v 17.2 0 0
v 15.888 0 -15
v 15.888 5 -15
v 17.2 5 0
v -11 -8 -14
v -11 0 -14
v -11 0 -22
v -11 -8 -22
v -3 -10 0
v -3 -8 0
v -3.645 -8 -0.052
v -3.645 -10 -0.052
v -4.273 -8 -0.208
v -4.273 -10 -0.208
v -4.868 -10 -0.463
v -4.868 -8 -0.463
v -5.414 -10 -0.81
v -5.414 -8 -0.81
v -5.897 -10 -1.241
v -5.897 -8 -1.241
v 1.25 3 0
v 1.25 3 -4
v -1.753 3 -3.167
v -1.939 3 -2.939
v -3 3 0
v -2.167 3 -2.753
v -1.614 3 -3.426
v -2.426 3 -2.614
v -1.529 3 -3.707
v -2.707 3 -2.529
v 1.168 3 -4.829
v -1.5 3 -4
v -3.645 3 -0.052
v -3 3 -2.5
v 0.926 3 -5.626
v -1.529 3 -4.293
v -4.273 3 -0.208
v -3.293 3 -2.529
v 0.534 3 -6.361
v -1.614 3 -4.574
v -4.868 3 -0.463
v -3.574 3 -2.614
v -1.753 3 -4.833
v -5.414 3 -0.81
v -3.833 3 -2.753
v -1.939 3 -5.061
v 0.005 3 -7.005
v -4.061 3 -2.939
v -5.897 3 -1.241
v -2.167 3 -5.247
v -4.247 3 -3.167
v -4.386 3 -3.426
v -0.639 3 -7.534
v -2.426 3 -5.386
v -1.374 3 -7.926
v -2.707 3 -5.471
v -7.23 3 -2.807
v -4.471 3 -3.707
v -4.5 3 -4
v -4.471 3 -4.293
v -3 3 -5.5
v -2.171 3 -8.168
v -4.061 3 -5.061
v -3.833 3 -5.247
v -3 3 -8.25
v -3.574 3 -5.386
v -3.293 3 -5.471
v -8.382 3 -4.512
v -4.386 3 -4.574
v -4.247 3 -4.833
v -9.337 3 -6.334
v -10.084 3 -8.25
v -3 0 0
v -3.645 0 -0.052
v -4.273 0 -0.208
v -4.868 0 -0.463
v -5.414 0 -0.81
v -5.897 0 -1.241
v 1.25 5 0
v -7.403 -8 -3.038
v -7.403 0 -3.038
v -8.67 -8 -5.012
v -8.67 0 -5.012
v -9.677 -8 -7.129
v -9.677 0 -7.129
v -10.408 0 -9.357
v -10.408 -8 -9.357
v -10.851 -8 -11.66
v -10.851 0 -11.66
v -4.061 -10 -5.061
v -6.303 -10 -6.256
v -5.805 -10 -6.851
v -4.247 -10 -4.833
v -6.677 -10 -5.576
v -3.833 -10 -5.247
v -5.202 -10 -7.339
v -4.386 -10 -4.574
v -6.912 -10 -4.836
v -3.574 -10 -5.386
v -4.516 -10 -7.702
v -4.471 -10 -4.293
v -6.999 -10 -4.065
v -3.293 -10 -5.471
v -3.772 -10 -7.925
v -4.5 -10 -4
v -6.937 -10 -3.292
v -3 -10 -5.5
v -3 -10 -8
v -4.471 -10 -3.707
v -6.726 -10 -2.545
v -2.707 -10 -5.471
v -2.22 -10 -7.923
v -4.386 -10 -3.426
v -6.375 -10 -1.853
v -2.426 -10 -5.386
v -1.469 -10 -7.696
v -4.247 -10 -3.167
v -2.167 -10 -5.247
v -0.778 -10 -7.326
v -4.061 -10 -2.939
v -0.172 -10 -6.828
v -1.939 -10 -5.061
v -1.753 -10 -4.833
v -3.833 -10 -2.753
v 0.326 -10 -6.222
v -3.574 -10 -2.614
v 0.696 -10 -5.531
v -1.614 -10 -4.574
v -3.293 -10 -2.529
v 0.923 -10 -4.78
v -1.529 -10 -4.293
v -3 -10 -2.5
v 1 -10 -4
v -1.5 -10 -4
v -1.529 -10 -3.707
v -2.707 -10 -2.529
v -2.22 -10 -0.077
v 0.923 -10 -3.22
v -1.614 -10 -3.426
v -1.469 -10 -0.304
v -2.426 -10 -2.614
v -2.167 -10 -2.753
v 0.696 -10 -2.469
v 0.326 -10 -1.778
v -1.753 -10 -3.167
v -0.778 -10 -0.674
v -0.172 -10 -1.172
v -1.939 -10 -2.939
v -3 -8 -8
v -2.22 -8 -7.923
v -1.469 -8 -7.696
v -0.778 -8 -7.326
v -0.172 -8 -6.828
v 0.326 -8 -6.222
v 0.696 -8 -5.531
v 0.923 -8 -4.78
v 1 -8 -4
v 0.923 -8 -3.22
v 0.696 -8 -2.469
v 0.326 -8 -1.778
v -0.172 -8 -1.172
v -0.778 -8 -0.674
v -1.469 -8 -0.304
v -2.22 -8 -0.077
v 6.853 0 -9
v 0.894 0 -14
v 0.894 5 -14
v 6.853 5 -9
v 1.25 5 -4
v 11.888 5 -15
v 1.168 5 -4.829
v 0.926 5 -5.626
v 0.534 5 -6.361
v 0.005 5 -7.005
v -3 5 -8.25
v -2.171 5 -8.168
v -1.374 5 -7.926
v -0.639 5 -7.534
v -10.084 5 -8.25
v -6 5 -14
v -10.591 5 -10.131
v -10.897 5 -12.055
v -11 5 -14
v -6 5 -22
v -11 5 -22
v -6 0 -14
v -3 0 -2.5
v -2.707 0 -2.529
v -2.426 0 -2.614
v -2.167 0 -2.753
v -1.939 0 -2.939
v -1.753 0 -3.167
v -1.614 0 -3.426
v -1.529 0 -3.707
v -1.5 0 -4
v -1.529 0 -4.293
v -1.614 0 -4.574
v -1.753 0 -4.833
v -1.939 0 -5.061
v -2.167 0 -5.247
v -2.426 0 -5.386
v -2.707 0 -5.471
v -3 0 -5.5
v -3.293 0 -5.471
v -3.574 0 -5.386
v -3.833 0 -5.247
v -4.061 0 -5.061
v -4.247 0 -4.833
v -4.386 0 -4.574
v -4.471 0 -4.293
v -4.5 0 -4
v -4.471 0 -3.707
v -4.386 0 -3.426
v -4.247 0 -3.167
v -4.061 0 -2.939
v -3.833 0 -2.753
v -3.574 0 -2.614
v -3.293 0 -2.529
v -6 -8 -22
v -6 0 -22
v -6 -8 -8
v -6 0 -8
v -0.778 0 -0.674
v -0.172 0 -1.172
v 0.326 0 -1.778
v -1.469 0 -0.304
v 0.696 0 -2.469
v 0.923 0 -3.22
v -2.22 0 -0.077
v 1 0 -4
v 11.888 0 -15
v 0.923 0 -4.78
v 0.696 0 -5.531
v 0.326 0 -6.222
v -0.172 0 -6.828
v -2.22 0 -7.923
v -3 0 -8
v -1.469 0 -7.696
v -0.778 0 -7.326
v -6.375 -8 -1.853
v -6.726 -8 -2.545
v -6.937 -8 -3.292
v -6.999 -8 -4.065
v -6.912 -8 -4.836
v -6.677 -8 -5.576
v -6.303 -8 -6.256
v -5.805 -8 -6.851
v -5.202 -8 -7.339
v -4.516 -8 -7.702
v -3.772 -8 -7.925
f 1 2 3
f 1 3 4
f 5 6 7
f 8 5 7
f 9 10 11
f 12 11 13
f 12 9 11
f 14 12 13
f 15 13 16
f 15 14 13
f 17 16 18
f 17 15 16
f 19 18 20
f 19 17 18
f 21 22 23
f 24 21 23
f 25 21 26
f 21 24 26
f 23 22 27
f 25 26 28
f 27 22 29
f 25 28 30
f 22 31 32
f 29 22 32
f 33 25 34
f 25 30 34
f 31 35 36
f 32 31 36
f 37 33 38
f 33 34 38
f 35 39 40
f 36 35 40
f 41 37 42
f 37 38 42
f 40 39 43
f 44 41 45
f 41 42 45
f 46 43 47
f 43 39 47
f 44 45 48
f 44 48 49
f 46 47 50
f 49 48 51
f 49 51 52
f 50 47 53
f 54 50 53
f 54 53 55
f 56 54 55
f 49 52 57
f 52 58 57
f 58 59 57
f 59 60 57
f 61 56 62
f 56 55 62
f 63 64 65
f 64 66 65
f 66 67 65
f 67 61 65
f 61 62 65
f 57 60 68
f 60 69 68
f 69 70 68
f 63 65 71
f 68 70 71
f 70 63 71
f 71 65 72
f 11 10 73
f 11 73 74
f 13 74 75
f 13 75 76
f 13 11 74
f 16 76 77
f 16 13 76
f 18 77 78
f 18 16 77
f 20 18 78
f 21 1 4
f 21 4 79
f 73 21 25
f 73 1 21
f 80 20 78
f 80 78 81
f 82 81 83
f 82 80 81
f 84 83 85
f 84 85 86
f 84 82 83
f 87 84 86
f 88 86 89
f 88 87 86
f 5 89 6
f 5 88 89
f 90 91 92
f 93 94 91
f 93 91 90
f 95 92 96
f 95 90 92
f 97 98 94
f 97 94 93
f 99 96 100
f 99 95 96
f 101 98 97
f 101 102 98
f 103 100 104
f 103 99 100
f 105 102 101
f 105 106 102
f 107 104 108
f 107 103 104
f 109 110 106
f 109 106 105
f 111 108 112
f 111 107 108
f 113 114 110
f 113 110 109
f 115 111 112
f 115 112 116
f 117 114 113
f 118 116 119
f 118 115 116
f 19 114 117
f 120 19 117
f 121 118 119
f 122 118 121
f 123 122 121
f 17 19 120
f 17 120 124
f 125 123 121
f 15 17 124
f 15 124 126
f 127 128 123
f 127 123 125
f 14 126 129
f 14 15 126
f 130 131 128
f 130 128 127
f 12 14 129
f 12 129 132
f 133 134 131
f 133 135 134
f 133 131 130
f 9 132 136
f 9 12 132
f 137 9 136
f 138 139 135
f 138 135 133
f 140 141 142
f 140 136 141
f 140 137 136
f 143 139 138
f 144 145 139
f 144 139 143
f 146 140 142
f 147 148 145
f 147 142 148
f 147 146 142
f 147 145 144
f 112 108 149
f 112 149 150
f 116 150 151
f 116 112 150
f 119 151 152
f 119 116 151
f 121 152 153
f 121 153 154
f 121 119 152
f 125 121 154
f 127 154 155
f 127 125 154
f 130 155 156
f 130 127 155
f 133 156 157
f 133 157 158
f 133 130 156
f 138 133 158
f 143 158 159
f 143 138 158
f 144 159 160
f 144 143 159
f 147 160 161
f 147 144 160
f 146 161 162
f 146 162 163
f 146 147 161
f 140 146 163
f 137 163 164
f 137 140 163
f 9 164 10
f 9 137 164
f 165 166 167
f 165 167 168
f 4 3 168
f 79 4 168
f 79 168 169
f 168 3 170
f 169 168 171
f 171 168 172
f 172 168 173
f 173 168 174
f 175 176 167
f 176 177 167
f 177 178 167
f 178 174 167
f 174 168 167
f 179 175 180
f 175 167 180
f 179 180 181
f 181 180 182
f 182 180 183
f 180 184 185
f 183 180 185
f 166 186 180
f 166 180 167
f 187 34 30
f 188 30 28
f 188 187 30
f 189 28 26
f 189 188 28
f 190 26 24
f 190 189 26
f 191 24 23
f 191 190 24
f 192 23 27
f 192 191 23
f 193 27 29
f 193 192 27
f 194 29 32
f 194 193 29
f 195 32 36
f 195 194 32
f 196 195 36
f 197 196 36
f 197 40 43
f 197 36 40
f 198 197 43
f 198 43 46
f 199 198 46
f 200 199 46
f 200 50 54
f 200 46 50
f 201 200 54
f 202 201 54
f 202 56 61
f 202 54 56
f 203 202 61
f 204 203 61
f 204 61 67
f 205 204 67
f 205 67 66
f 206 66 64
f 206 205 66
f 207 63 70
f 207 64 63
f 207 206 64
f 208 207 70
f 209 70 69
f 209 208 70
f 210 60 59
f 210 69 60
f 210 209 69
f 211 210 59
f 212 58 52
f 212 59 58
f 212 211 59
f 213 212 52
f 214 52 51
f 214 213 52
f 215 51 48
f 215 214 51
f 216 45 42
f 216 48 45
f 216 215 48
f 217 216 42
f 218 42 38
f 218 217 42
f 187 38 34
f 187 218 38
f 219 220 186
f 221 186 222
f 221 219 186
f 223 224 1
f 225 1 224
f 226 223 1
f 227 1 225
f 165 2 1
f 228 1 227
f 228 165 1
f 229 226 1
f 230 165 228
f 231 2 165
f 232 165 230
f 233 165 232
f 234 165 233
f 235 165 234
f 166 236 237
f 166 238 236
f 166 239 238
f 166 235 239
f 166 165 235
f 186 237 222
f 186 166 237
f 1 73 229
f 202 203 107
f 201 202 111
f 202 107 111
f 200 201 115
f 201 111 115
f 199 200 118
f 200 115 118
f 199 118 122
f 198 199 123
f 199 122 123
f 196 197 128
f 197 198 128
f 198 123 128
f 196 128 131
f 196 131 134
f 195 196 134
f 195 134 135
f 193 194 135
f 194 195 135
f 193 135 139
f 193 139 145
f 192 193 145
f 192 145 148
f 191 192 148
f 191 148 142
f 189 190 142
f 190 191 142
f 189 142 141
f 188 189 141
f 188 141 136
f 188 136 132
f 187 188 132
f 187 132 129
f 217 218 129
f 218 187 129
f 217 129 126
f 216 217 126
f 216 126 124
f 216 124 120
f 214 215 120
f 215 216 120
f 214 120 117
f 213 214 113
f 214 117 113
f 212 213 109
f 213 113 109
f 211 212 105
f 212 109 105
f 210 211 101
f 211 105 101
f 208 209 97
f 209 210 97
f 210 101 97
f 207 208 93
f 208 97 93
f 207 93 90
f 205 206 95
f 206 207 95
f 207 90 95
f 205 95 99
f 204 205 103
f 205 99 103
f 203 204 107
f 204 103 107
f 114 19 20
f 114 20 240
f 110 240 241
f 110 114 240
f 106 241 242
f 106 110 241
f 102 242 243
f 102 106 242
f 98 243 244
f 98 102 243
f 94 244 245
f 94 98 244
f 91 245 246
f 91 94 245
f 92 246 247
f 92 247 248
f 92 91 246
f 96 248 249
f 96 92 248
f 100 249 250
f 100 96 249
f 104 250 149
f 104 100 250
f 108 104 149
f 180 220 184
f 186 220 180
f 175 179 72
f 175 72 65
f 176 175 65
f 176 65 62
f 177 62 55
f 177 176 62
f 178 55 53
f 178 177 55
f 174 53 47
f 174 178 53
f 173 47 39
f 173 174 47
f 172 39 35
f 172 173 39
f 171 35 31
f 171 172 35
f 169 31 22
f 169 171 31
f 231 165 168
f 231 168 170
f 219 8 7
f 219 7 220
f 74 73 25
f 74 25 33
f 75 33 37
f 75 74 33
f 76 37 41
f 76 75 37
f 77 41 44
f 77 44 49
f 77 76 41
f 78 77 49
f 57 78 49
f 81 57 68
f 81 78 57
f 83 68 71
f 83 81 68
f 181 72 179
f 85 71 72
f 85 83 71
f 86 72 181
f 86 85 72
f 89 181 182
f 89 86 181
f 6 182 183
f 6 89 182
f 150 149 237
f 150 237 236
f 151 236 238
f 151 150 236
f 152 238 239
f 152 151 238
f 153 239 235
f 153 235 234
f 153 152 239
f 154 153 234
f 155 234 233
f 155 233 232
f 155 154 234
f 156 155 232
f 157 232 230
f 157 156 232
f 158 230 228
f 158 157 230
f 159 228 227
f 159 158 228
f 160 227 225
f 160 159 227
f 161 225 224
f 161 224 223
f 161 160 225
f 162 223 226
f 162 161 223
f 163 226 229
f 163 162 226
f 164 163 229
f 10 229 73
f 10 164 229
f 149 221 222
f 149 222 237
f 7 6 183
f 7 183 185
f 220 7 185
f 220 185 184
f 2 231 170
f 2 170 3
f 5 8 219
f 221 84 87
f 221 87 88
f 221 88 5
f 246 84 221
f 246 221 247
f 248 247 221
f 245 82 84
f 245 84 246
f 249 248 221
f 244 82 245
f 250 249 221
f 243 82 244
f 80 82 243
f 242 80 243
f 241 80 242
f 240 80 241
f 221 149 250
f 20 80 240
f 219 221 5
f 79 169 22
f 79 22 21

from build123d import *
from build123d.topology import SkipClean

# Parameters (mm, degrees)
SKETCH1_R           = 1.5
BOSS_EXTRUDE1_DEPTH = 5
BOSS_EXTRUDE2_START = 10
SKETCH2_R           = 1.5
BOSS_EXTRUDE2_DEPTH = 10
CUT_EXTRUDE1_DEPTH  = 2
SKETCH4_OUTSIDE_W   = 37.956
SKETCH4_OUTSIDE_H   = 31.756
SKETCH4_OUTSIDE_R   = 4
CUT_EXTRUDE2_DEPTH  = 2


with BuildPart() as part:
    # Sketch1 → Boss-Extrude1 (new body)
    with BuildSketch(Plane(origin=(0, 0, 0), x_dir=(1, 0, 0), z_dir=(0, 1, 0))):
        with BuildLine():
            Line((-11, 14), (-11, 22))
            Line((-11, 22), (-6, 22))
            Line((-6, 22), (-6, 14))
            Line((-6, 14), (0.894304297, 14))
            Line((0.894304297, 14), (6.85307226, 9))
            Line((6.85307226, 9), (11.887670047, 15))
            Line((11.887670047, 15), (15.887670047, 15))
            Line((15.887670047, 15), (17.2, 0))
            Line((17.2, 0), (-3, 0))
            ThreePointArc((-3, 0), (-4.575677194, 0.32341988), (-5.896551724, 1.24137931))
            ThreePointArc((-5.896551724, 1.24137931), (-9.676818781, 7.129272487), (-11, 14))
        make_face()
        with Locations(Location((-3, 4, 0), (0, 0, 270))):
            Circle(SKETCH1_R, mode=Mode.SUBTRACT)
    extrude(amount=BOSS_EXTRUDE1_DEPTH)

    # Sketch2 → Boss-Extrude2 (add)
    with SkipClean():  # the faces are left unmerged after this step: merging them gives an invalid solid
        with BuildSketch(Plane.XZ.offset(BOSS_EXTRUDE2_START)):
            with BuildLine():
                Line((-11, -14), (-11, -22))
                Line((-11, -22), (-6, -22))
                Line((-6, -22), (-6, -8))
                Line((-6, -8), (-3, -8))
                ThreePointArc((-3, -8), (1, -4), (-3, 0))
                ThreePointArc((-3, 0), (-4.575677194, -0.32341988), (-5.896551724, -1.24137931))
                ThreePointArc((-5.896551724, -1.24137931), (-9.676818781, -7.129272487), (-11, -14))
            make_face()
            with Locations(Location((-3, -4, 0), (0, 0, 270))):
                Circle(SKETCH2_R, mode=Mode.SUBTRACT)
        extrude(amount=-BOSS_EXTRUDE2_DEPTH)

    # Sketch3 → Cut-Extrude1 (cut)
    with SkipClean():  # the faces are left unmerged after this step: merging them gives an invalid solid
        with BuildSketch(Plane(origin=(0, 5, 0), x_dir=(1, 0, 0), z_dir=(0, 1, 0))):
            with BuildLine():
                Line((1.25, 4), (1.25, 0))
                Line((1.25, 0), (-10.083728274, 0))
                Line((-10.083728274, 0), (-10.083728274, 8.25))
                Line((-10.083728274, 8.25), (-3, 8.25))
                ThreePointArc((-3, 8.25), (0.00520382, 7.00520382), (1.25, 4))
            make_face()
        extrude(amount=-CUT_EXTRUDE1_DEPTH, mode=Mode.SUBTRACT)

    # Sketch4 outside → Cut-Extrude2 (cut)
    with SkipClean():  # the faces are left unmerged after this step: merging them gives an invalid solid
        with BuildSketch(Plane.XZ.offset(10)):
            with Locations((3.1, -11)):
                Rectangle(SKETCH4_OUTSIDE_W, SKETCH4_OUTSIDE_H)
            with Locations(Location((-3, -4, 0), (0, 0, 270))):
                Circle(SKETCH4_OUTSIDE_R, mode=Mode.SUBTRACT)
        extrude(amount=-CUT_EXTRUDE2_DEPTH, mode=Mode.SUBTRACT)


solid = part.part
